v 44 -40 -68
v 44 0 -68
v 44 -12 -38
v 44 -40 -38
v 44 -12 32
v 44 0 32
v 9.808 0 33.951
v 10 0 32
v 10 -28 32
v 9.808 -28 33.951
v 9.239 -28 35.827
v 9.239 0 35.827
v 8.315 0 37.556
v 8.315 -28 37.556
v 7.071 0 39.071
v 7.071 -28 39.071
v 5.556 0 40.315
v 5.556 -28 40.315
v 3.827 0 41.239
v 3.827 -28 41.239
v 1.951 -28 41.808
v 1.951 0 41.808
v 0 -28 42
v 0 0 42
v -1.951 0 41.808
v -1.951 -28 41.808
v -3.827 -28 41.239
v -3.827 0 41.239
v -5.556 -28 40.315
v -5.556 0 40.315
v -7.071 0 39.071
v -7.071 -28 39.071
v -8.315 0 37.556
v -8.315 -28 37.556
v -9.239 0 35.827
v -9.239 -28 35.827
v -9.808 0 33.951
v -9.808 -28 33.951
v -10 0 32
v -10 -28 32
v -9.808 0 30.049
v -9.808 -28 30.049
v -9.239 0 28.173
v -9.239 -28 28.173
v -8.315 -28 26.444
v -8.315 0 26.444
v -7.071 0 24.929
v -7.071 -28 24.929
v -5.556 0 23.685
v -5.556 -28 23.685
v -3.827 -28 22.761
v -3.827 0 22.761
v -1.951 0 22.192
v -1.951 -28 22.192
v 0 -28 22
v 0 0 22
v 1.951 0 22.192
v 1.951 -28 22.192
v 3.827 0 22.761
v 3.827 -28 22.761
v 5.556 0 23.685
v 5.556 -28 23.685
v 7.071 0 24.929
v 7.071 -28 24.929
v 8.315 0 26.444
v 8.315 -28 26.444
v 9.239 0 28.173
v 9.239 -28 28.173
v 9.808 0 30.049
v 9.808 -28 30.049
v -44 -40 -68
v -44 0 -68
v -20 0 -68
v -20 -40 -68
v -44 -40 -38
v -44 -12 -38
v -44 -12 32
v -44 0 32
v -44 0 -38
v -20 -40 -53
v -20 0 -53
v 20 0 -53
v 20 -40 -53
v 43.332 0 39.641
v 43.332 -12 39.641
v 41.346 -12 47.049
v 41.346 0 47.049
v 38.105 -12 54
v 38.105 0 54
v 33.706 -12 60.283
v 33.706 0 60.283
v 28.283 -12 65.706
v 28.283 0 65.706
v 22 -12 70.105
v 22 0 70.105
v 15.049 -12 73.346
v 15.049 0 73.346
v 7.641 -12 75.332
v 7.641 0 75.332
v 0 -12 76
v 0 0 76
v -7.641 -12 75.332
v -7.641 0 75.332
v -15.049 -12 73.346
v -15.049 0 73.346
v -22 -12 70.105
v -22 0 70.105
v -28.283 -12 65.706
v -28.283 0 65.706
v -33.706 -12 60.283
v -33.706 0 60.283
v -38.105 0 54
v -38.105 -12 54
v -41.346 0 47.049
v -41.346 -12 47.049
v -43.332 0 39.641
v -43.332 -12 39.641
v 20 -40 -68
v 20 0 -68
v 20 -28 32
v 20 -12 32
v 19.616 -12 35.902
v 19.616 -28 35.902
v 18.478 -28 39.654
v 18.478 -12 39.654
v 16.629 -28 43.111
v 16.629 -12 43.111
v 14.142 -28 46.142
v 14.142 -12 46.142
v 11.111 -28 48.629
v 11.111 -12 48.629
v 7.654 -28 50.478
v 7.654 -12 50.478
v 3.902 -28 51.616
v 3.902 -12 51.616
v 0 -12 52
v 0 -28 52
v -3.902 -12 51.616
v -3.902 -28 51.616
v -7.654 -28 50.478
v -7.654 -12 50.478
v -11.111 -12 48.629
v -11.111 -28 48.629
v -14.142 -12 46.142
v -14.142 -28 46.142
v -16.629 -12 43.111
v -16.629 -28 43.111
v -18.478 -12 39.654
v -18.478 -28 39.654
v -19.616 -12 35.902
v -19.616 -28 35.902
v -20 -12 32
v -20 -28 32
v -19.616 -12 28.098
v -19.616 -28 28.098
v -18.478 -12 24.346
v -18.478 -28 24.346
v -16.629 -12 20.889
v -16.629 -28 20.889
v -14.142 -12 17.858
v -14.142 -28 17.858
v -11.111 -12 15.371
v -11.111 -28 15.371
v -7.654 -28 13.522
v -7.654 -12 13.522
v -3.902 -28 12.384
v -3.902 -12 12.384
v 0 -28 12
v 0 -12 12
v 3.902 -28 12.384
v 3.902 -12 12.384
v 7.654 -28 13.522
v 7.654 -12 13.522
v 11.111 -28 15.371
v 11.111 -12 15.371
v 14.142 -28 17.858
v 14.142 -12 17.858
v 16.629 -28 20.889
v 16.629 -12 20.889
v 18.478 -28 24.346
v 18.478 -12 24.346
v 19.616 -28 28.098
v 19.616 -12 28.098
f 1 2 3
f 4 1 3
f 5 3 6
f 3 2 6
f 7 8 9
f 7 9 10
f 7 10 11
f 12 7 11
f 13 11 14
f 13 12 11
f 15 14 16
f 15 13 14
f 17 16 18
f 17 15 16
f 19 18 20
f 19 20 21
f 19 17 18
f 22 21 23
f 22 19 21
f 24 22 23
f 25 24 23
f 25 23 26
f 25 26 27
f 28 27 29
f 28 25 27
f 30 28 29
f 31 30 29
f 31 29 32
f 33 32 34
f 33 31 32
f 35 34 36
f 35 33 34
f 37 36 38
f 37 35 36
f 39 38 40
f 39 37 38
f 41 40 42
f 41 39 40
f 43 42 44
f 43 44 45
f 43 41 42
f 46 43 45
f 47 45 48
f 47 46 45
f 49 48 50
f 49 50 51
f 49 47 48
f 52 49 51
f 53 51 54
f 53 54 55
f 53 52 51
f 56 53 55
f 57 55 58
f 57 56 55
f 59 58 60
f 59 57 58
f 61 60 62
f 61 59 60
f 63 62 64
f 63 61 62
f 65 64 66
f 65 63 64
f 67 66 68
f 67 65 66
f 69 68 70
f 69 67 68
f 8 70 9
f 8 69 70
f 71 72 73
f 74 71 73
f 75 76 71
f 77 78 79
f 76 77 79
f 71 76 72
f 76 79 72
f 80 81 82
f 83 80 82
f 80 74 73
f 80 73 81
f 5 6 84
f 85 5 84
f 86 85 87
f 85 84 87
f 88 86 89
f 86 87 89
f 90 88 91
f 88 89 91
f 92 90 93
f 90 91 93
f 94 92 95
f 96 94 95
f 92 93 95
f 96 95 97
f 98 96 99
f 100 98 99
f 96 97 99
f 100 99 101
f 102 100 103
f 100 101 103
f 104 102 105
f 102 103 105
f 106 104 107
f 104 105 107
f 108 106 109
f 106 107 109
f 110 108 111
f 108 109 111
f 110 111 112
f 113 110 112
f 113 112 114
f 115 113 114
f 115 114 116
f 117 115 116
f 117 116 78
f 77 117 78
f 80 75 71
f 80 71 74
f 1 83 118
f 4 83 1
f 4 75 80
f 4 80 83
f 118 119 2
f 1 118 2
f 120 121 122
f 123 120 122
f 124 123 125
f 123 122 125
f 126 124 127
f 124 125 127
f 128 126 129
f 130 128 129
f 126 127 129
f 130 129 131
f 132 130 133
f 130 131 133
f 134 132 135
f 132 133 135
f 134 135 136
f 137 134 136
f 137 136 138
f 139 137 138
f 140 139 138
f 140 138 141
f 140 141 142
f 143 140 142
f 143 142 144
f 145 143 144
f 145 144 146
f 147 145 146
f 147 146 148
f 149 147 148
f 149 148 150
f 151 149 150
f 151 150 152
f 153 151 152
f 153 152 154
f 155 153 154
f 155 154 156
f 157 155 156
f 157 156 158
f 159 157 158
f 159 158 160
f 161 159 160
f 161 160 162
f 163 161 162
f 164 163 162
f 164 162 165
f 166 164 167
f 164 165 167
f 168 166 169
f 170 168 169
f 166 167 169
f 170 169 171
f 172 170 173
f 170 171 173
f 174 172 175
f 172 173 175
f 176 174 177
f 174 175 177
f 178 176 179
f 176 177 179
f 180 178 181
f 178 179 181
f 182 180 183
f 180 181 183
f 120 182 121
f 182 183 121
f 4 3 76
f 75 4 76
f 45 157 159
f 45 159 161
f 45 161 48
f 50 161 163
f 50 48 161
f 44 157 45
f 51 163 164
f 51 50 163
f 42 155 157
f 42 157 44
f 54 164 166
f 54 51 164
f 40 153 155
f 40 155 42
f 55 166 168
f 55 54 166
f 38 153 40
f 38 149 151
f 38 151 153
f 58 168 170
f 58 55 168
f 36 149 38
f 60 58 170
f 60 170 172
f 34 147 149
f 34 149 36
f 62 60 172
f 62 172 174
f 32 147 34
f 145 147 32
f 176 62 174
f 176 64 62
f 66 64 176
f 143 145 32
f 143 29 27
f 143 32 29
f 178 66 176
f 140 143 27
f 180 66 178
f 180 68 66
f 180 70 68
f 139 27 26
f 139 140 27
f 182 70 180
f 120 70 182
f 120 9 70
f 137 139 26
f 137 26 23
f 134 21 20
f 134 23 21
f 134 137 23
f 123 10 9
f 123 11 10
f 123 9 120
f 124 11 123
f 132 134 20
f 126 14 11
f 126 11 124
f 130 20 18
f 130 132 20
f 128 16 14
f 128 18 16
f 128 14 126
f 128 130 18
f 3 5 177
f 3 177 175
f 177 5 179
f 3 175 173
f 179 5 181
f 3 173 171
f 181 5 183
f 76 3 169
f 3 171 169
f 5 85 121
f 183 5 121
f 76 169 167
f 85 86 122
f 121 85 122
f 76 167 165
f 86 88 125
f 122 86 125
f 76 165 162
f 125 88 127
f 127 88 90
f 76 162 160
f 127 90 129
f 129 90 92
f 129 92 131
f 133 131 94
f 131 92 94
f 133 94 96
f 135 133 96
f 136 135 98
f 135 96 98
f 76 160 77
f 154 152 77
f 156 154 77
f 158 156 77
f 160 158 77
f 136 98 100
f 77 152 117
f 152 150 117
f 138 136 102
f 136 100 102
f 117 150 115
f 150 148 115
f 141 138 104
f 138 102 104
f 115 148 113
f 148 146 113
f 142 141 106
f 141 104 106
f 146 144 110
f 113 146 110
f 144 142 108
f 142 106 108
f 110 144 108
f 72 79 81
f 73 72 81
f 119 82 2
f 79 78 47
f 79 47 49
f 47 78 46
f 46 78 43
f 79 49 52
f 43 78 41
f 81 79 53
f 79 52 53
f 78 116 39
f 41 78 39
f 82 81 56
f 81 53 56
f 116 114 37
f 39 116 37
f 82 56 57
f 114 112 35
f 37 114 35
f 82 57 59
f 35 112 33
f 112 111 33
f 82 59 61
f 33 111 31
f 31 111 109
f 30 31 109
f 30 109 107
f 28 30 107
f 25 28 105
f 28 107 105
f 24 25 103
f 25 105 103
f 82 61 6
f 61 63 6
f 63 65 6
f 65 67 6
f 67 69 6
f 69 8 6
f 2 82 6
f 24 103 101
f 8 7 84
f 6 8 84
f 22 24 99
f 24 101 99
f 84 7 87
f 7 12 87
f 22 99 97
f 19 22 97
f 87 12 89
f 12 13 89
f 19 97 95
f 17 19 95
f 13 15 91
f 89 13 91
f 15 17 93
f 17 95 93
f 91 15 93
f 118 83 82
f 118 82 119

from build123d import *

# Parameters (mm, degrees)
F0_R     = 20
F0_R_2   = 10
F1_DEPTH = 28
F2_DEPTH = 12
F3_DEPTH = 40


# Not quite as in the source:
# - ends of sketch curves that miss each other by under 0.0002 mm in the source are joined


with BuildPart() as f1:
    # F0 (on Front) → F1 (new body)
    with BuildSketch(Plane.XZ):
        with Locations((0, 32)):
            Circle(F0_R)
        with Locations((0, 32)):
            Circle(F0_R_2, mode=Mode.SUBTRACT)
    extrude(amount=F1_DEPTH)

    # F0 (on Front) → F2 (join)
    with BuildSketch(Plane.XZ):
        with BuildLine():
            add(Edge.make_bspline(
                [(-43.9999970173, -38), (-43.9999970173, -14.6666666667), (-43.9999970173, 8.6666666667), (-43.9999970173, 32)],
                knots=[0, 0, 0, 0, 70, 70, 70, 70], degree=3))
            Line((-43.9999970173, -38), (44, -38))
            Line((44, -38), (44, 32))
            ThreePointArc((44, 32), (0, 76), (-43.9999970173, 32))
        make_face()
        with Locations((0, 32)):
            Circle(F0_R, mode=Mode.SUBTRACT)
    extrude(amount=F2_DEPTH)

    # F0 (on Front) → F3 (join)
    with BuildSketch(Plane.XZ):
        Polygon((-43.9999970173, -38), (-43.9999970173, -68), (-20, -68), (-20, -53), (20, -53), (20, -68), (44, -68), (44, -38), align=None)
    extrude(amount=F3_DEPTH)


solid = f1.part
